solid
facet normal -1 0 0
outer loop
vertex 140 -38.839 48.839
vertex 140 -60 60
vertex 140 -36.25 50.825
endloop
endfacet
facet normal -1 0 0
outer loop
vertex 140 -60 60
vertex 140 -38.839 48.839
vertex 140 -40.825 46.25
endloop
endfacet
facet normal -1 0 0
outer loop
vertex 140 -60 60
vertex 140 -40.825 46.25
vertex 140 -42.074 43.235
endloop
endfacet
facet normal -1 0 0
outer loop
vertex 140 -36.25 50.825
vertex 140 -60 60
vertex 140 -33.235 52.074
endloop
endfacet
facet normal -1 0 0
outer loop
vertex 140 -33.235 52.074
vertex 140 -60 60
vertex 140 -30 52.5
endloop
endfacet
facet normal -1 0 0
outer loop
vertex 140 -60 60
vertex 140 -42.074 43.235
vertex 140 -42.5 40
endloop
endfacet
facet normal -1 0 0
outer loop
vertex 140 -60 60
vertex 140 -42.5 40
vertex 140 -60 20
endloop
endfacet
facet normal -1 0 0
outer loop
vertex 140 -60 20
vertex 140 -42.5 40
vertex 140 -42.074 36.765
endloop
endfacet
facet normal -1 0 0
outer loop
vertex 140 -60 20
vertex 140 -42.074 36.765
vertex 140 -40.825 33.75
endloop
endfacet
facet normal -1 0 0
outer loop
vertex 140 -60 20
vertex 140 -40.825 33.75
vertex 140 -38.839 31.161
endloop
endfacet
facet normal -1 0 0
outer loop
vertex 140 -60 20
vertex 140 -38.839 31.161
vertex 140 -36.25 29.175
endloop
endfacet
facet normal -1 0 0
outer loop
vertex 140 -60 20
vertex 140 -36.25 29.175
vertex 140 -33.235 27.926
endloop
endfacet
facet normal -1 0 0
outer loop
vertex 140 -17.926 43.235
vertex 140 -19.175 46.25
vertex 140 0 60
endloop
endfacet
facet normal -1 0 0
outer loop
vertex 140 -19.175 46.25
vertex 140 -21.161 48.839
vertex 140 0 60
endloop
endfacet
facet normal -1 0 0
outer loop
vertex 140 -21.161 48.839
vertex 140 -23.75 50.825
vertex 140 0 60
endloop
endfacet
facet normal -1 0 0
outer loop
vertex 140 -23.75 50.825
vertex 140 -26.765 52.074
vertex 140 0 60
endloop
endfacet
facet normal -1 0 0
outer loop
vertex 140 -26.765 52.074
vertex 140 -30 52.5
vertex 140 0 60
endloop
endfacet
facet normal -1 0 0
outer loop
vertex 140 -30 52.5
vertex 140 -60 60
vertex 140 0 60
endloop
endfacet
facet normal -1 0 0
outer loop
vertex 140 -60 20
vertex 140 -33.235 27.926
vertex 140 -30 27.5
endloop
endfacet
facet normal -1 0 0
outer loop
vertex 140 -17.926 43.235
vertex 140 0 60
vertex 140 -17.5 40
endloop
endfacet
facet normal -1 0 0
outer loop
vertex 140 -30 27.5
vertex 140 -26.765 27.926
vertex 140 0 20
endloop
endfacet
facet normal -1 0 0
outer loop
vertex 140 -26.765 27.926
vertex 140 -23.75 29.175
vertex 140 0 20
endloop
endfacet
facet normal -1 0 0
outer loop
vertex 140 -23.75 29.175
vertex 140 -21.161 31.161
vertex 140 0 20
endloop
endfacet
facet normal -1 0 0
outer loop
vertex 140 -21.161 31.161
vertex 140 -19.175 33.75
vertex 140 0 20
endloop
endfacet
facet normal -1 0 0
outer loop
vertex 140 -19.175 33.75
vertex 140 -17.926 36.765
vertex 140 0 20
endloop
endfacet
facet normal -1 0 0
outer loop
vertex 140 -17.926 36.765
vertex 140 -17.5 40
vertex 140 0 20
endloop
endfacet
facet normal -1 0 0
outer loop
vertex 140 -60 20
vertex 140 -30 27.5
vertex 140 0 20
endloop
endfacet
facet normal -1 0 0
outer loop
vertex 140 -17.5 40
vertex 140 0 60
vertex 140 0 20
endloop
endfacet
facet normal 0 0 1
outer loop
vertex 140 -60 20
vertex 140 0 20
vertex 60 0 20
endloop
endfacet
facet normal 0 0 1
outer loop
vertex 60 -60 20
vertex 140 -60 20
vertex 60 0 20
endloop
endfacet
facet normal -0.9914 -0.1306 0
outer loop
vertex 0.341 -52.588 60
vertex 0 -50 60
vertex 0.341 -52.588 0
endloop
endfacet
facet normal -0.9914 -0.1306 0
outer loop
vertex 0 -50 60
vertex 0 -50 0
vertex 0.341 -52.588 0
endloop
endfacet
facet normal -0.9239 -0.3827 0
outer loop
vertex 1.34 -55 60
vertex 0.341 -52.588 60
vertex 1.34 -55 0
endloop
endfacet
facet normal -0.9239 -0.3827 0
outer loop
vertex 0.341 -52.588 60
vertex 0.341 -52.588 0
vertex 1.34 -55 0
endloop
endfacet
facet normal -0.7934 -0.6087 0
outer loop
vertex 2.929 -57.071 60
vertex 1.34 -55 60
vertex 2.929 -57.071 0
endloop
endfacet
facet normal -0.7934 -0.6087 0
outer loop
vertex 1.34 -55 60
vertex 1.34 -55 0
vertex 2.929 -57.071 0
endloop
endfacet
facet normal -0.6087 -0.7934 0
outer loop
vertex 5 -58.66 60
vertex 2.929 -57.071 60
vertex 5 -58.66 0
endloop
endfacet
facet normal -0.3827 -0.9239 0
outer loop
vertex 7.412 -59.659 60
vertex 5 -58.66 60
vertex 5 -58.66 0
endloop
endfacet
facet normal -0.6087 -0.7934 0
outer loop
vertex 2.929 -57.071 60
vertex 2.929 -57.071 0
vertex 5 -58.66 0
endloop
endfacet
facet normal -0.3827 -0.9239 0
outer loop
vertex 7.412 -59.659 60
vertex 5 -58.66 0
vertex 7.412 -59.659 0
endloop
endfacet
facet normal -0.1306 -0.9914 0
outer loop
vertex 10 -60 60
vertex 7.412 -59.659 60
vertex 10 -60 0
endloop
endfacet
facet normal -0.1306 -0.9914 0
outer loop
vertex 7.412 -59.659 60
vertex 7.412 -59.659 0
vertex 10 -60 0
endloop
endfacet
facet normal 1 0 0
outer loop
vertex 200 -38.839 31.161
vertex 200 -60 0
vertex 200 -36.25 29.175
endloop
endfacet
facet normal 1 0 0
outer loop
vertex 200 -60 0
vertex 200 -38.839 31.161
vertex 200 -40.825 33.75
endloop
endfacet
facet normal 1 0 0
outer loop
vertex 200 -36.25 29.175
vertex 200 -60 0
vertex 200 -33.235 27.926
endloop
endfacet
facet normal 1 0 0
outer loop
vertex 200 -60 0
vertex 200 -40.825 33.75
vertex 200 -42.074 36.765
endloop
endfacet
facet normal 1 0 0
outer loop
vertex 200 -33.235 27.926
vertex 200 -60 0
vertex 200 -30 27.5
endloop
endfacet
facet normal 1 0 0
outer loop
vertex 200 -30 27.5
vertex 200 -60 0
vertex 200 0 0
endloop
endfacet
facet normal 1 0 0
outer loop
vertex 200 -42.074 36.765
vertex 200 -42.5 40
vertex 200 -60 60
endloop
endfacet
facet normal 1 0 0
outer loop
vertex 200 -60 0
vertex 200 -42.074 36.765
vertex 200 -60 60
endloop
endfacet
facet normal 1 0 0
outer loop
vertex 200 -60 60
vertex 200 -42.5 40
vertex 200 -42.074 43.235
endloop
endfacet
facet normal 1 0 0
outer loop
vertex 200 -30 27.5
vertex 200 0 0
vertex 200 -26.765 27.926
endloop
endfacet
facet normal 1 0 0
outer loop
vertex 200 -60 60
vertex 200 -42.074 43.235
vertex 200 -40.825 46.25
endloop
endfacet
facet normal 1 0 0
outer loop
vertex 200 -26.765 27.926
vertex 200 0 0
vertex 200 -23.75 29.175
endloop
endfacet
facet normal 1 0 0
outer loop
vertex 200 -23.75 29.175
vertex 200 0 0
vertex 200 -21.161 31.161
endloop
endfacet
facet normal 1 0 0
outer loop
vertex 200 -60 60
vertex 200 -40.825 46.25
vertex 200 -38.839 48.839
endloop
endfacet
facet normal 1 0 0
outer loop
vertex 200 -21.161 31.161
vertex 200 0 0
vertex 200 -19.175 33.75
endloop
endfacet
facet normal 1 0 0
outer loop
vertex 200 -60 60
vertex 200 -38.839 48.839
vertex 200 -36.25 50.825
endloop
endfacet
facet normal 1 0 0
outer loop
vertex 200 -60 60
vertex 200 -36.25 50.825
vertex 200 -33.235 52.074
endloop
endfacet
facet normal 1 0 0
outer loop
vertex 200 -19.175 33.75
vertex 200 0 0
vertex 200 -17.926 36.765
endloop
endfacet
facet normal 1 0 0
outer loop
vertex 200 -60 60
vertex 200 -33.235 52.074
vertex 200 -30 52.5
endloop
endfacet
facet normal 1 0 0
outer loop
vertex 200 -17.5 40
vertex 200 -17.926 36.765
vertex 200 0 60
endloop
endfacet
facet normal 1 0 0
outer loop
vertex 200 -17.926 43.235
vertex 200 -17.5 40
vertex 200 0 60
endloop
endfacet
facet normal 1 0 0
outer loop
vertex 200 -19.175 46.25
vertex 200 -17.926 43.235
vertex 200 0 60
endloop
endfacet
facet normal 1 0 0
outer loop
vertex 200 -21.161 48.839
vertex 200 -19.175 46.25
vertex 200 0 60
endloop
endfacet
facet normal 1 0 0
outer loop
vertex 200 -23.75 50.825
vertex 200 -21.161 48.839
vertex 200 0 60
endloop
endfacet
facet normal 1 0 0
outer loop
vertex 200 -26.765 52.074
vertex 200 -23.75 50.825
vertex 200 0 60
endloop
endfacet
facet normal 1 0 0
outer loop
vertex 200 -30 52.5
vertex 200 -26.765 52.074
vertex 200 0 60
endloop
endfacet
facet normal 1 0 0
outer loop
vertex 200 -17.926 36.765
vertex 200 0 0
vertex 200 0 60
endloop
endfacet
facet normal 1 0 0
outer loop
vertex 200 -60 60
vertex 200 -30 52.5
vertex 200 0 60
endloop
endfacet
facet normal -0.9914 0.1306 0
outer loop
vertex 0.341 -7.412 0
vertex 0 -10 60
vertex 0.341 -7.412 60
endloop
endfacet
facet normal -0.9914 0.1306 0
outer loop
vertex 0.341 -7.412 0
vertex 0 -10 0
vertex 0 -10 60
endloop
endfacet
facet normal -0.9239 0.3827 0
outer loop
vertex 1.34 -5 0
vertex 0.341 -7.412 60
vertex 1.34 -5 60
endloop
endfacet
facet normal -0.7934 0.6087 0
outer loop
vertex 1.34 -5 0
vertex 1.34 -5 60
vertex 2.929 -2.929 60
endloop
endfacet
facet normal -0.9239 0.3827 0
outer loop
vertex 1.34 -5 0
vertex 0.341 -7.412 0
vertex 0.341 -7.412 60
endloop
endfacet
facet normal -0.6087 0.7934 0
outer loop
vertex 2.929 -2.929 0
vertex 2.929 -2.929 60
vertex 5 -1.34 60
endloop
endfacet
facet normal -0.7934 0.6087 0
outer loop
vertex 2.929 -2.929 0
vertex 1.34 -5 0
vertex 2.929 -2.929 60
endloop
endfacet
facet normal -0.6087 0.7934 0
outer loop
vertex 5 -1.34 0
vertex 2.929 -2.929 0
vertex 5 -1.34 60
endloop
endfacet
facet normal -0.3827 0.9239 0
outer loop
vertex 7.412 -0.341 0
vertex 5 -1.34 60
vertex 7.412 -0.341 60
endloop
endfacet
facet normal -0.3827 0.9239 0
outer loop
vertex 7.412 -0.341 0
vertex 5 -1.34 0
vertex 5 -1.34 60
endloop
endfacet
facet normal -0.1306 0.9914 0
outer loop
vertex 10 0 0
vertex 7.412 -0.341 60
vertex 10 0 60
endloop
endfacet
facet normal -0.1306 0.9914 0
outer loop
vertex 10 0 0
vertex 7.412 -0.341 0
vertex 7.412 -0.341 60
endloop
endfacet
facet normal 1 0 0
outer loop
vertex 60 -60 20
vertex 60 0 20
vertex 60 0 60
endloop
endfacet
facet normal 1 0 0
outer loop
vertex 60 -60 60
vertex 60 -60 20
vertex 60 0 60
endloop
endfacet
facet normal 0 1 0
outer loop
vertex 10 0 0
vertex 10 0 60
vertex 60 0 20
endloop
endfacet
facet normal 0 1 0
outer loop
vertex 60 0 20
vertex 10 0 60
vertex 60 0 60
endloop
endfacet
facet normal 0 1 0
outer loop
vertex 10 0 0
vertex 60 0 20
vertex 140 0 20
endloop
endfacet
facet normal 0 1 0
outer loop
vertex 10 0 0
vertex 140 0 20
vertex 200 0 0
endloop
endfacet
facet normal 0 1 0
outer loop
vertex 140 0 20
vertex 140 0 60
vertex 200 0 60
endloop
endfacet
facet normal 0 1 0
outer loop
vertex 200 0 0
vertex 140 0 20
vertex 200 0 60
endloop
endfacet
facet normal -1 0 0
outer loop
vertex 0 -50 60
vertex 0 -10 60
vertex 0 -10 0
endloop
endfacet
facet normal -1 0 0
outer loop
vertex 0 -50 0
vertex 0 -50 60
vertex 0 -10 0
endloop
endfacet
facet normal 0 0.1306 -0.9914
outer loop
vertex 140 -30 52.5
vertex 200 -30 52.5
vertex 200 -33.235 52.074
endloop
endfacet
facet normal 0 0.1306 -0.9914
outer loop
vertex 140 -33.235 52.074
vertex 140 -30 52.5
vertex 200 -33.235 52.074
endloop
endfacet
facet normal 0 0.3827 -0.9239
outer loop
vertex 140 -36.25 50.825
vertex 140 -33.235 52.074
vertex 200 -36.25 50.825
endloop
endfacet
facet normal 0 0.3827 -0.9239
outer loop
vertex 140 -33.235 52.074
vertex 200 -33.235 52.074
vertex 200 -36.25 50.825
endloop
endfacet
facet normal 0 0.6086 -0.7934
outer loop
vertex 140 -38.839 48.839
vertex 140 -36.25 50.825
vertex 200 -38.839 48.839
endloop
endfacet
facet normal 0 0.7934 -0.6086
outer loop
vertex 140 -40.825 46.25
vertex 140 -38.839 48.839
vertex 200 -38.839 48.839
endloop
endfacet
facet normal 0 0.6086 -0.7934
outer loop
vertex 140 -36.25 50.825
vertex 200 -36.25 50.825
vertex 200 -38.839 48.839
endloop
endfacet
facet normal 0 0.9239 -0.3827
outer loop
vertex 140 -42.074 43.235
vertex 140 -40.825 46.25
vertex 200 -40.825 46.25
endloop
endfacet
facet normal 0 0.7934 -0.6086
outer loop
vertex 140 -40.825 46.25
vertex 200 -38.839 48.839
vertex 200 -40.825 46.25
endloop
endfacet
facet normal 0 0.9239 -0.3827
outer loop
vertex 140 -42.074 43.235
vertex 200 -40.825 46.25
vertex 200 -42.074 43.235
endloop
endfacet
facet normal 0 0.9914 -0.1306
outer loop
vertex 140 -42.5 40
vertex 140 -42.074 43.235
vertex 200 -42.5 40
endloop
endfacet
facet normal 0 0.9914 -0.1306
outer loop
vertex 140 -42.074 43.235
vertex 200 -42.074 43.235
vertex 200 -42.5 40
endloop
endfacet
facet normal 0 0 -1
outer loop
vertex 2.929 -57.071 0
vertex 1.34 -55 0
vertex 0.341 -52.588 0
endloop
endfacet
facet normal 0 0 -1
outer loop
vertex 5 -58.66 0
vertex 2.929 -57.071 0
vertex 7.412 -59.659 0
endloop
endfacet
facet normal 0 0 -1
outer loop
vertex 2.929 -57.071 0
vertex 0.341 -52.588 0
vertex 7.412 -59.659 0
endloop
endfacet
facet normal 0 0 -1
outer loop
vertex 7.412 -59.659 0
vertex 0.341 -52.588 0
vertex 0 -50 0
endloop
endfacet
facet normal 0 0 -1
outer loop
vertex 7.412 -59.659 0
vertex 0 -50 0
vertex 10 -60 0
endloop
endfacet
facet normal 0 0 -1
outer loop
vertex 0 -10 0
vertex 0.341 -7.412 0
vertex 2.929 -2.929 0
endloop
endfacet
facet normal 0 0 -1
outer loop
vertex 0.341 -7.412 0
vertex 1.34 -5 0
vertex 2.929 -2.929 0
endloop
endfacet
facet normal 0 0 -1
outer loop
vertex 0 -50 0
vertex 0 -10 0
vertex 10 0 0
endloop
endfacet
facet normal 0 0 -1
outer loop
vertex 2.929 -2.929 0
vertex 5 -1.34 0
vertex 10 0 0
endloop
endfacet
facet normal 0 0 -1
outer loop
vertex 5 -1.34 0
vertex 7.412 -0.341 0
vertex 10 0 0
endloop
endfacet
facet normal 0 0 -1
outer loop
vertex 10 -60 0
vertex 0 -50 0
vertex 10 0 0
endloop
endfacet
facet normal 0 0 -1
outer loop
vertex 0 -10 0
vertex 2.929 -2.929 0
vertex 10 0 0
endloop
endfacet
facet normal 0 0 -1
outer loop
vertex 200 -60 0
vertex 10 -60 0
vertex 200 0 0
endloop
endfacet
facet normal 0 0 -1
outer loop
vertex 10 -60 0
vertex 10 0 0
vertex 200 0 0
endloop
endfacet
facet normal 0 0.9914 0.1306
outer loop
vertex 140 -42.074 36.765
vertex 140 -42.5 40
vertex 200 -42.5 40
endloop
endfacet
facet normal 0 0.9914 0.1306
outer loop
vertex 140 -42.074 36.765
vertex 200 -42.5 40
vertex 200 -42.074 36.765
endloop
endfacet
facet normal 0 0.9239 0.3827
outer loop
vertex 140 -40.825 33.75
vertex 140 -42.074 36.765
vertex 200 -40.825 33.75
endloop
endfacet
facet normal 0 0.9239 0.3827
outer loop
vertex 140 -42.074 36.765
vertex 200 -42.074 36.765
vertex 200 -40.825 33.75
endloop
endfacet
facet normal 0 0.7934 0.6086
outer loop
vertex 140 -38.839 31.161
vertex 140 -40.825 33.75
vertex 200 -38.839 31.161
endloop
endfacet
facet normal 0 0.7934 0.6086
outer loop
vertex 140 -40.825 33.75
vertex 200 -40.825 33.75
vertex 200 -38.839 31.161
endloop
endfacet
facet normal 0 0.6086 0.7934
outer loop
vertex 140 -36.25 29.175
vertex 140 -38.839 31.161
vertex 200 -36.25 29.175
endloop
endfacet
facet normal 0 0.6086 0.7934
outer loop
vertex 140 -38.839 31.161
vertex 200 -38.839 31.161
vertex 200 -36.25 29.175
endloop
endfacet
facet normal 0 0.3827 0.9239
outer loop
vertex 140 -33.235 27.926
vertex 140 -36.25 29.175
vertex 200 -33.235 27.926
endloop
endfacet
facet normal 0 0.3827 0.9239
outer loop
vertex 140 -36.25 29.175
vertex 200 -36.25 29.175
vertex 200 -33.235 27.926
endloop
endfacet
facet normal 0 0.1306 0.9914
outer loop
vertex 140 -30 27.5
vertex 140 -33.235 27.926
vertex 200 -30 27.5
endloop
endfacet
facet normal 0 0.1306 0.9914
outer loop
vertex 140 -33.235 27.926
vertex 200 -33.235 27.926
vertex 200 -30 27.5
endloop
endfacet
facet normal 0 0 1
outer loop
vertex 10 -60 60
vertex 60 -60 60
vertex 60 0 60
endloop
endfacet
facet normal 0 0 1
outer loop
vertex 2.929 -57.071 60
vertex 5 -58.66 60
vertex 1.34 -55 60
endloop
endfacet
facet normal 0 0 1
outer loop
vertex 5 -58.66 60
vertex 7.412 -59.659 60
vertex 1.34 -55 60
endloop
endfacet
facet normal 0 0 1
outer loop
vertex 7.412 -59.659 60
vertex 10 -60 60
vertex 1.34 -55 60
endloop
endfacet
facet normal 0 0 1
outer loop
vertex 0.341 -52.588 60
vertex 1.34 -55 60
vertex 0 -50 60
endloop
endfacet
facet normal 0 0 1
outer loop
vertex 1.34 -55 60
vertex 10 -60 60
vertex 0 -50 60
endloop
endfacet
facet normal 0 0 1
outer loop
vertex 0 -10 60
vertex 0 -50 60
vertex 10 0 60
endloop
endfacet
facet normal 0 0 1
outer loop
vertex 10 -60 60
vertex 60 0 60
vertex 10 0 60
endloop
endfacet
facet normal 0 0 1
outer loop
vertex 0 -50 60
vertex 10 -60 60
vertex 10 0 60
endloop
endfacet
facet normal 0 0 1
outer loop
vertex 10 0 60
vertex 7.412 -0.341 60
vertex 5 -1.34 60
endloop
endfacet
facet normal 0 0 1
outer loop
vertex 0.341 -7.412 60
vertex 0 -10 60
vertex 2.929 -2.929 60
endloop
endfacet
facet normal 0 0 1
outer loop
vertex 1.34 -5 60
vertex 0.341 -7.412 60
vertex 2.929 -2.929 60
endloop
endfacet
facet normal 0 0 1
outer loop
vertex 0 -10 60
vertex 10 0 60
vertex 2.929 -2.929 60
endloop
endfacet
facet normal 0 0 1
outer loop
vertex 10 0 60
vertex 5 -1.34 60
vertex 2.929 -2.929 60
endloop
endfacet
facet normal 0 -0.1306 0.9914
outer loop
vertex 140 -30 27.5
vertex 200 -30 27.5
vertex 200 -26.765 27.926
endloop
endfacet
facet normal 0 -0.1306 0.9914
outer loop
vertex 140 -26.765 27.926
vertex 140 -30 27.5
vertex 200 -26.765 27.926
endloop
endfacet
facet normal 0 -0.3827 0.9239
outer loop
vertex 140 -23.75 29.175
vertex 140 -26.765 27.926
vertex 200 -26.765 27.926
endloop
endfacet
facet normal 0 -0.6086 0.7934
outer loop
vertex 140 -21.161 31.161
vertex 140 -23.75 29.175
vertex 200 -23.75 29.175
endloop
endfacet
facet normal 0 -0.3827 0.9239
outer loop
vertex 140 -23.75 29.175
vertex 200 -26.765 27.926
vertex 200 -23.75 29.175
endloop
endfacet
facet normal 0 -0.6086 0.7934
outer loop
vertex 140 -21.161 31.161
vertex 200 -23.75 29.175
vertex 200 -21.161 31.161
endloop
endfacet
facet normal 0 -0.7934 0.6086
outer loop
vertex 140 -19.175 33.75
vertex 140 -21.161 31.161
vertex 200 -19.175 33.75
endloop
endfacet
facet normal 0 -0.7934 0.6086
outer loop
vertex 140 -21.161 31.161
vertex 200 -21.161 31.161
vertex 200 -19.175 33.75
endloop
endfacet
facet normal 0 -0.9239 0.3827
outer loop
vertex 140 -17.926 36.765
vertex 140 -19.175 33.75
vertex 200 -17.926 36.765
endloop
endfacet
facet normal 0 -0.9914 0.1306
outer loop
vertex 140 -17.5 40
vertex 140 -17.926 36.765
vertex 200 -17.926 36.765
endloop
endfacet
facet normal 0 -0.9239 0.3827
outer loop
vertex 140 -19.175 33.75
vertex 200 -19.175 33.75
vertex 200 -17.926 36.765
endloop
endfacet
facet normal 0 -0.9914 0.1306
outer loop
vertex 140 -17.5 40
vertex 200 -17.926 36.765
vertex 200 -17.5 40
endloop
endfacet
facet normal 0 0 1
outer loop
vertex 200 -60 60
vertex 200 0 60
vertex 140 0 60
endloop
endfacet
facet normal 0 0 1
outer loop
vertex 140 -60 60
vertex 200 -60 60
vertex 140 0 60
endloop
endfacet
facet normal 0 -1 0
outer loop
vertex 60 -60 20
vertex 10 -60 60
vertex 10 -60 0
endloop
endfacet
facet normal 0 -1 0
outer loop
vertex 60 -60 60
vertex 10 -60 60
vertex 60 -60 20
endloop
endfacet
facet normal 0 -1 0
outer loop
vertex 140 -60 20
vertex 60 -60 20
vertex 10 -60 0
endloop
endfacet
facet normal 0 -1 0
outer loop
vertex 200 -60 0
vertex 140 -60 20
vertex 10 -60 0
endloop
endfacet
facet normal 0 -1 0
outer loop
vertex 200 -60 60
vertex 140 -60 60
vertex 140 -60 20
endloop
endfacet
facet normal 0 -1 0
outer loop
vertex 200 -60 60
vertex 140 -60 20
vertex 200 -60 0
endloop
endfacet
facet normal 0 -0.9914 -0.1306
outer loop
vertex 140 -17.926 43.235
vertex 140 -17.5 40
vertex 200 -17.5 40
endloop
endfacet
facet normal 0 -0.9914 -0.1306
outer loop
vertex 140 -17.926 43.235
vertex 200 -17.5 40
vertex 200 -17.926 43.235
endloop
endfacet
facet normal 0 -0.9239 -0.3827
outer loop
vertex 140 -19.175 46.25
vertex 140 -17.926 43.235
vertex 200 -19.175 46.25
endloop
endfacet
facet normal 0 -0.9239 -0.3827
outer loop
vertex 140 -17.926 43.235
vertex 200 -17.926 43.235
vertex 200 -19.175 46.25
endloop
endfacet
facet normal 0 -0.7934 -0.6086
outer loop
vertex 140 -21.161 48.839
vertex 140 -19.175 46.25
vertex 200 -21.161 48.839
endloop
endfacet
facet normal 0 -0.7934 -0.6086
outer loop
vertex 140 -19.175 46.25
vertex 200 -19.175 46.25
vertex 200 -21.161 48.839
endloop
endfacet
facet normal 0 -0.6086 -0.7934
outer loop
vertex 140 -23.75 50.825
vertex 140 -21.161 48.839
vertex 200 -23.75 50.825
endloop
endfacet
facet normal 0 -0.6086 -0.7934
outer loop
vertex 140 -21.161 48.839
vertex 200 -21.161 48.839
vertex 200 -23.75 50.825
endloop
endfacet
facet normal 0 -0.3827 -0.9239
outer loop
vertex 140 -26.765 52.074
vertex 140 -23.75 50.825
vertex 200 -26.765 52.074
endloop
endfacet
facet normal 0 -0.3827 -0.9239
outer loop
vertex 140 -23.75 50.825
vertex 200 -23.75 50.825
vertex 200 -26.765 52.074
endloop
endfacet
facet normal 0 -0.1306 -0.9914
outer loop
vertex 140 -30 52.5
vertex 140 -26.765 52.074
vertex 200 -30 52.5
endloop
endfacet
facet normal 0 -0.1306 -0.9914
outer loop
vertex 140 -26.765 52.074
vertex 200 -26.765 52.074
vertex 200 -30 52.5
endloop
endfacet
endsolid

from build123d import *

# Parameters (mm, degrees)
F1_DEPTH = 60
F3_DEPTH = 60
F4_R     = 10


with BuildPart() as f1:
    # F0 (on Front) → F1 (new body)
    with BuildSketch(Plane.XZ):
        Polygon((0, 60), (0, 0), (200, 0), (200, 60), (140, 60), (140, 20), (60, 20), (60, 60), align=None)
    extrude(amount=F1_DEPTH)

    # F2 (on face) → F3 (cut)
    with BuildSketch(Plane.YZ.offset(200)):
        with BuildLine():
            Line((-30, 40), (-17.5, 40))
            ThreePointArc((-17.5, 40), (-21.1611652352, 48.8388347648), (-30, 52.5))
            Line((-30, 52.5), (-30, 40))
        make_face()
        with BuildLine():
            Line((-30, 40), (-30, 52.5))
            ThreePointArc((-30, 52.5), (-38.8388347648, 48.8388347648), (-42.5, 40))
            Line((-42.5, 40), (-30, 40))
        make_face()
        with BuildLine():
            ThreePointArc((-42.5, 40), (-38.8388347648, 31.1611652352), (-30, 27.5))
            Line((-30, 27.5), (-30, 40))
            Line((-30, 40), (-42.5, 40))
        make_face()
        with BuildLine():
            ThreePointArc((-30, 27.5), (-21.1611652352, 31.1611652352), (-17.5, 40))
            Line((-17.5, 40), (-30, 40))
            Line((-30, 40), (-30, 27.5))
        make_face()
    extrude(amount=-F3_DEPTH, mode=Mode.SUBTRACT)

    # F4
    f4_edges = [f1.edges().sort_by_distance(p)[0] for p in [
        (0, 0, 30),
        (0, -60, 30),
    ]]
    fillet(f4_edges, radius=F4_R)


solid = f1.part
